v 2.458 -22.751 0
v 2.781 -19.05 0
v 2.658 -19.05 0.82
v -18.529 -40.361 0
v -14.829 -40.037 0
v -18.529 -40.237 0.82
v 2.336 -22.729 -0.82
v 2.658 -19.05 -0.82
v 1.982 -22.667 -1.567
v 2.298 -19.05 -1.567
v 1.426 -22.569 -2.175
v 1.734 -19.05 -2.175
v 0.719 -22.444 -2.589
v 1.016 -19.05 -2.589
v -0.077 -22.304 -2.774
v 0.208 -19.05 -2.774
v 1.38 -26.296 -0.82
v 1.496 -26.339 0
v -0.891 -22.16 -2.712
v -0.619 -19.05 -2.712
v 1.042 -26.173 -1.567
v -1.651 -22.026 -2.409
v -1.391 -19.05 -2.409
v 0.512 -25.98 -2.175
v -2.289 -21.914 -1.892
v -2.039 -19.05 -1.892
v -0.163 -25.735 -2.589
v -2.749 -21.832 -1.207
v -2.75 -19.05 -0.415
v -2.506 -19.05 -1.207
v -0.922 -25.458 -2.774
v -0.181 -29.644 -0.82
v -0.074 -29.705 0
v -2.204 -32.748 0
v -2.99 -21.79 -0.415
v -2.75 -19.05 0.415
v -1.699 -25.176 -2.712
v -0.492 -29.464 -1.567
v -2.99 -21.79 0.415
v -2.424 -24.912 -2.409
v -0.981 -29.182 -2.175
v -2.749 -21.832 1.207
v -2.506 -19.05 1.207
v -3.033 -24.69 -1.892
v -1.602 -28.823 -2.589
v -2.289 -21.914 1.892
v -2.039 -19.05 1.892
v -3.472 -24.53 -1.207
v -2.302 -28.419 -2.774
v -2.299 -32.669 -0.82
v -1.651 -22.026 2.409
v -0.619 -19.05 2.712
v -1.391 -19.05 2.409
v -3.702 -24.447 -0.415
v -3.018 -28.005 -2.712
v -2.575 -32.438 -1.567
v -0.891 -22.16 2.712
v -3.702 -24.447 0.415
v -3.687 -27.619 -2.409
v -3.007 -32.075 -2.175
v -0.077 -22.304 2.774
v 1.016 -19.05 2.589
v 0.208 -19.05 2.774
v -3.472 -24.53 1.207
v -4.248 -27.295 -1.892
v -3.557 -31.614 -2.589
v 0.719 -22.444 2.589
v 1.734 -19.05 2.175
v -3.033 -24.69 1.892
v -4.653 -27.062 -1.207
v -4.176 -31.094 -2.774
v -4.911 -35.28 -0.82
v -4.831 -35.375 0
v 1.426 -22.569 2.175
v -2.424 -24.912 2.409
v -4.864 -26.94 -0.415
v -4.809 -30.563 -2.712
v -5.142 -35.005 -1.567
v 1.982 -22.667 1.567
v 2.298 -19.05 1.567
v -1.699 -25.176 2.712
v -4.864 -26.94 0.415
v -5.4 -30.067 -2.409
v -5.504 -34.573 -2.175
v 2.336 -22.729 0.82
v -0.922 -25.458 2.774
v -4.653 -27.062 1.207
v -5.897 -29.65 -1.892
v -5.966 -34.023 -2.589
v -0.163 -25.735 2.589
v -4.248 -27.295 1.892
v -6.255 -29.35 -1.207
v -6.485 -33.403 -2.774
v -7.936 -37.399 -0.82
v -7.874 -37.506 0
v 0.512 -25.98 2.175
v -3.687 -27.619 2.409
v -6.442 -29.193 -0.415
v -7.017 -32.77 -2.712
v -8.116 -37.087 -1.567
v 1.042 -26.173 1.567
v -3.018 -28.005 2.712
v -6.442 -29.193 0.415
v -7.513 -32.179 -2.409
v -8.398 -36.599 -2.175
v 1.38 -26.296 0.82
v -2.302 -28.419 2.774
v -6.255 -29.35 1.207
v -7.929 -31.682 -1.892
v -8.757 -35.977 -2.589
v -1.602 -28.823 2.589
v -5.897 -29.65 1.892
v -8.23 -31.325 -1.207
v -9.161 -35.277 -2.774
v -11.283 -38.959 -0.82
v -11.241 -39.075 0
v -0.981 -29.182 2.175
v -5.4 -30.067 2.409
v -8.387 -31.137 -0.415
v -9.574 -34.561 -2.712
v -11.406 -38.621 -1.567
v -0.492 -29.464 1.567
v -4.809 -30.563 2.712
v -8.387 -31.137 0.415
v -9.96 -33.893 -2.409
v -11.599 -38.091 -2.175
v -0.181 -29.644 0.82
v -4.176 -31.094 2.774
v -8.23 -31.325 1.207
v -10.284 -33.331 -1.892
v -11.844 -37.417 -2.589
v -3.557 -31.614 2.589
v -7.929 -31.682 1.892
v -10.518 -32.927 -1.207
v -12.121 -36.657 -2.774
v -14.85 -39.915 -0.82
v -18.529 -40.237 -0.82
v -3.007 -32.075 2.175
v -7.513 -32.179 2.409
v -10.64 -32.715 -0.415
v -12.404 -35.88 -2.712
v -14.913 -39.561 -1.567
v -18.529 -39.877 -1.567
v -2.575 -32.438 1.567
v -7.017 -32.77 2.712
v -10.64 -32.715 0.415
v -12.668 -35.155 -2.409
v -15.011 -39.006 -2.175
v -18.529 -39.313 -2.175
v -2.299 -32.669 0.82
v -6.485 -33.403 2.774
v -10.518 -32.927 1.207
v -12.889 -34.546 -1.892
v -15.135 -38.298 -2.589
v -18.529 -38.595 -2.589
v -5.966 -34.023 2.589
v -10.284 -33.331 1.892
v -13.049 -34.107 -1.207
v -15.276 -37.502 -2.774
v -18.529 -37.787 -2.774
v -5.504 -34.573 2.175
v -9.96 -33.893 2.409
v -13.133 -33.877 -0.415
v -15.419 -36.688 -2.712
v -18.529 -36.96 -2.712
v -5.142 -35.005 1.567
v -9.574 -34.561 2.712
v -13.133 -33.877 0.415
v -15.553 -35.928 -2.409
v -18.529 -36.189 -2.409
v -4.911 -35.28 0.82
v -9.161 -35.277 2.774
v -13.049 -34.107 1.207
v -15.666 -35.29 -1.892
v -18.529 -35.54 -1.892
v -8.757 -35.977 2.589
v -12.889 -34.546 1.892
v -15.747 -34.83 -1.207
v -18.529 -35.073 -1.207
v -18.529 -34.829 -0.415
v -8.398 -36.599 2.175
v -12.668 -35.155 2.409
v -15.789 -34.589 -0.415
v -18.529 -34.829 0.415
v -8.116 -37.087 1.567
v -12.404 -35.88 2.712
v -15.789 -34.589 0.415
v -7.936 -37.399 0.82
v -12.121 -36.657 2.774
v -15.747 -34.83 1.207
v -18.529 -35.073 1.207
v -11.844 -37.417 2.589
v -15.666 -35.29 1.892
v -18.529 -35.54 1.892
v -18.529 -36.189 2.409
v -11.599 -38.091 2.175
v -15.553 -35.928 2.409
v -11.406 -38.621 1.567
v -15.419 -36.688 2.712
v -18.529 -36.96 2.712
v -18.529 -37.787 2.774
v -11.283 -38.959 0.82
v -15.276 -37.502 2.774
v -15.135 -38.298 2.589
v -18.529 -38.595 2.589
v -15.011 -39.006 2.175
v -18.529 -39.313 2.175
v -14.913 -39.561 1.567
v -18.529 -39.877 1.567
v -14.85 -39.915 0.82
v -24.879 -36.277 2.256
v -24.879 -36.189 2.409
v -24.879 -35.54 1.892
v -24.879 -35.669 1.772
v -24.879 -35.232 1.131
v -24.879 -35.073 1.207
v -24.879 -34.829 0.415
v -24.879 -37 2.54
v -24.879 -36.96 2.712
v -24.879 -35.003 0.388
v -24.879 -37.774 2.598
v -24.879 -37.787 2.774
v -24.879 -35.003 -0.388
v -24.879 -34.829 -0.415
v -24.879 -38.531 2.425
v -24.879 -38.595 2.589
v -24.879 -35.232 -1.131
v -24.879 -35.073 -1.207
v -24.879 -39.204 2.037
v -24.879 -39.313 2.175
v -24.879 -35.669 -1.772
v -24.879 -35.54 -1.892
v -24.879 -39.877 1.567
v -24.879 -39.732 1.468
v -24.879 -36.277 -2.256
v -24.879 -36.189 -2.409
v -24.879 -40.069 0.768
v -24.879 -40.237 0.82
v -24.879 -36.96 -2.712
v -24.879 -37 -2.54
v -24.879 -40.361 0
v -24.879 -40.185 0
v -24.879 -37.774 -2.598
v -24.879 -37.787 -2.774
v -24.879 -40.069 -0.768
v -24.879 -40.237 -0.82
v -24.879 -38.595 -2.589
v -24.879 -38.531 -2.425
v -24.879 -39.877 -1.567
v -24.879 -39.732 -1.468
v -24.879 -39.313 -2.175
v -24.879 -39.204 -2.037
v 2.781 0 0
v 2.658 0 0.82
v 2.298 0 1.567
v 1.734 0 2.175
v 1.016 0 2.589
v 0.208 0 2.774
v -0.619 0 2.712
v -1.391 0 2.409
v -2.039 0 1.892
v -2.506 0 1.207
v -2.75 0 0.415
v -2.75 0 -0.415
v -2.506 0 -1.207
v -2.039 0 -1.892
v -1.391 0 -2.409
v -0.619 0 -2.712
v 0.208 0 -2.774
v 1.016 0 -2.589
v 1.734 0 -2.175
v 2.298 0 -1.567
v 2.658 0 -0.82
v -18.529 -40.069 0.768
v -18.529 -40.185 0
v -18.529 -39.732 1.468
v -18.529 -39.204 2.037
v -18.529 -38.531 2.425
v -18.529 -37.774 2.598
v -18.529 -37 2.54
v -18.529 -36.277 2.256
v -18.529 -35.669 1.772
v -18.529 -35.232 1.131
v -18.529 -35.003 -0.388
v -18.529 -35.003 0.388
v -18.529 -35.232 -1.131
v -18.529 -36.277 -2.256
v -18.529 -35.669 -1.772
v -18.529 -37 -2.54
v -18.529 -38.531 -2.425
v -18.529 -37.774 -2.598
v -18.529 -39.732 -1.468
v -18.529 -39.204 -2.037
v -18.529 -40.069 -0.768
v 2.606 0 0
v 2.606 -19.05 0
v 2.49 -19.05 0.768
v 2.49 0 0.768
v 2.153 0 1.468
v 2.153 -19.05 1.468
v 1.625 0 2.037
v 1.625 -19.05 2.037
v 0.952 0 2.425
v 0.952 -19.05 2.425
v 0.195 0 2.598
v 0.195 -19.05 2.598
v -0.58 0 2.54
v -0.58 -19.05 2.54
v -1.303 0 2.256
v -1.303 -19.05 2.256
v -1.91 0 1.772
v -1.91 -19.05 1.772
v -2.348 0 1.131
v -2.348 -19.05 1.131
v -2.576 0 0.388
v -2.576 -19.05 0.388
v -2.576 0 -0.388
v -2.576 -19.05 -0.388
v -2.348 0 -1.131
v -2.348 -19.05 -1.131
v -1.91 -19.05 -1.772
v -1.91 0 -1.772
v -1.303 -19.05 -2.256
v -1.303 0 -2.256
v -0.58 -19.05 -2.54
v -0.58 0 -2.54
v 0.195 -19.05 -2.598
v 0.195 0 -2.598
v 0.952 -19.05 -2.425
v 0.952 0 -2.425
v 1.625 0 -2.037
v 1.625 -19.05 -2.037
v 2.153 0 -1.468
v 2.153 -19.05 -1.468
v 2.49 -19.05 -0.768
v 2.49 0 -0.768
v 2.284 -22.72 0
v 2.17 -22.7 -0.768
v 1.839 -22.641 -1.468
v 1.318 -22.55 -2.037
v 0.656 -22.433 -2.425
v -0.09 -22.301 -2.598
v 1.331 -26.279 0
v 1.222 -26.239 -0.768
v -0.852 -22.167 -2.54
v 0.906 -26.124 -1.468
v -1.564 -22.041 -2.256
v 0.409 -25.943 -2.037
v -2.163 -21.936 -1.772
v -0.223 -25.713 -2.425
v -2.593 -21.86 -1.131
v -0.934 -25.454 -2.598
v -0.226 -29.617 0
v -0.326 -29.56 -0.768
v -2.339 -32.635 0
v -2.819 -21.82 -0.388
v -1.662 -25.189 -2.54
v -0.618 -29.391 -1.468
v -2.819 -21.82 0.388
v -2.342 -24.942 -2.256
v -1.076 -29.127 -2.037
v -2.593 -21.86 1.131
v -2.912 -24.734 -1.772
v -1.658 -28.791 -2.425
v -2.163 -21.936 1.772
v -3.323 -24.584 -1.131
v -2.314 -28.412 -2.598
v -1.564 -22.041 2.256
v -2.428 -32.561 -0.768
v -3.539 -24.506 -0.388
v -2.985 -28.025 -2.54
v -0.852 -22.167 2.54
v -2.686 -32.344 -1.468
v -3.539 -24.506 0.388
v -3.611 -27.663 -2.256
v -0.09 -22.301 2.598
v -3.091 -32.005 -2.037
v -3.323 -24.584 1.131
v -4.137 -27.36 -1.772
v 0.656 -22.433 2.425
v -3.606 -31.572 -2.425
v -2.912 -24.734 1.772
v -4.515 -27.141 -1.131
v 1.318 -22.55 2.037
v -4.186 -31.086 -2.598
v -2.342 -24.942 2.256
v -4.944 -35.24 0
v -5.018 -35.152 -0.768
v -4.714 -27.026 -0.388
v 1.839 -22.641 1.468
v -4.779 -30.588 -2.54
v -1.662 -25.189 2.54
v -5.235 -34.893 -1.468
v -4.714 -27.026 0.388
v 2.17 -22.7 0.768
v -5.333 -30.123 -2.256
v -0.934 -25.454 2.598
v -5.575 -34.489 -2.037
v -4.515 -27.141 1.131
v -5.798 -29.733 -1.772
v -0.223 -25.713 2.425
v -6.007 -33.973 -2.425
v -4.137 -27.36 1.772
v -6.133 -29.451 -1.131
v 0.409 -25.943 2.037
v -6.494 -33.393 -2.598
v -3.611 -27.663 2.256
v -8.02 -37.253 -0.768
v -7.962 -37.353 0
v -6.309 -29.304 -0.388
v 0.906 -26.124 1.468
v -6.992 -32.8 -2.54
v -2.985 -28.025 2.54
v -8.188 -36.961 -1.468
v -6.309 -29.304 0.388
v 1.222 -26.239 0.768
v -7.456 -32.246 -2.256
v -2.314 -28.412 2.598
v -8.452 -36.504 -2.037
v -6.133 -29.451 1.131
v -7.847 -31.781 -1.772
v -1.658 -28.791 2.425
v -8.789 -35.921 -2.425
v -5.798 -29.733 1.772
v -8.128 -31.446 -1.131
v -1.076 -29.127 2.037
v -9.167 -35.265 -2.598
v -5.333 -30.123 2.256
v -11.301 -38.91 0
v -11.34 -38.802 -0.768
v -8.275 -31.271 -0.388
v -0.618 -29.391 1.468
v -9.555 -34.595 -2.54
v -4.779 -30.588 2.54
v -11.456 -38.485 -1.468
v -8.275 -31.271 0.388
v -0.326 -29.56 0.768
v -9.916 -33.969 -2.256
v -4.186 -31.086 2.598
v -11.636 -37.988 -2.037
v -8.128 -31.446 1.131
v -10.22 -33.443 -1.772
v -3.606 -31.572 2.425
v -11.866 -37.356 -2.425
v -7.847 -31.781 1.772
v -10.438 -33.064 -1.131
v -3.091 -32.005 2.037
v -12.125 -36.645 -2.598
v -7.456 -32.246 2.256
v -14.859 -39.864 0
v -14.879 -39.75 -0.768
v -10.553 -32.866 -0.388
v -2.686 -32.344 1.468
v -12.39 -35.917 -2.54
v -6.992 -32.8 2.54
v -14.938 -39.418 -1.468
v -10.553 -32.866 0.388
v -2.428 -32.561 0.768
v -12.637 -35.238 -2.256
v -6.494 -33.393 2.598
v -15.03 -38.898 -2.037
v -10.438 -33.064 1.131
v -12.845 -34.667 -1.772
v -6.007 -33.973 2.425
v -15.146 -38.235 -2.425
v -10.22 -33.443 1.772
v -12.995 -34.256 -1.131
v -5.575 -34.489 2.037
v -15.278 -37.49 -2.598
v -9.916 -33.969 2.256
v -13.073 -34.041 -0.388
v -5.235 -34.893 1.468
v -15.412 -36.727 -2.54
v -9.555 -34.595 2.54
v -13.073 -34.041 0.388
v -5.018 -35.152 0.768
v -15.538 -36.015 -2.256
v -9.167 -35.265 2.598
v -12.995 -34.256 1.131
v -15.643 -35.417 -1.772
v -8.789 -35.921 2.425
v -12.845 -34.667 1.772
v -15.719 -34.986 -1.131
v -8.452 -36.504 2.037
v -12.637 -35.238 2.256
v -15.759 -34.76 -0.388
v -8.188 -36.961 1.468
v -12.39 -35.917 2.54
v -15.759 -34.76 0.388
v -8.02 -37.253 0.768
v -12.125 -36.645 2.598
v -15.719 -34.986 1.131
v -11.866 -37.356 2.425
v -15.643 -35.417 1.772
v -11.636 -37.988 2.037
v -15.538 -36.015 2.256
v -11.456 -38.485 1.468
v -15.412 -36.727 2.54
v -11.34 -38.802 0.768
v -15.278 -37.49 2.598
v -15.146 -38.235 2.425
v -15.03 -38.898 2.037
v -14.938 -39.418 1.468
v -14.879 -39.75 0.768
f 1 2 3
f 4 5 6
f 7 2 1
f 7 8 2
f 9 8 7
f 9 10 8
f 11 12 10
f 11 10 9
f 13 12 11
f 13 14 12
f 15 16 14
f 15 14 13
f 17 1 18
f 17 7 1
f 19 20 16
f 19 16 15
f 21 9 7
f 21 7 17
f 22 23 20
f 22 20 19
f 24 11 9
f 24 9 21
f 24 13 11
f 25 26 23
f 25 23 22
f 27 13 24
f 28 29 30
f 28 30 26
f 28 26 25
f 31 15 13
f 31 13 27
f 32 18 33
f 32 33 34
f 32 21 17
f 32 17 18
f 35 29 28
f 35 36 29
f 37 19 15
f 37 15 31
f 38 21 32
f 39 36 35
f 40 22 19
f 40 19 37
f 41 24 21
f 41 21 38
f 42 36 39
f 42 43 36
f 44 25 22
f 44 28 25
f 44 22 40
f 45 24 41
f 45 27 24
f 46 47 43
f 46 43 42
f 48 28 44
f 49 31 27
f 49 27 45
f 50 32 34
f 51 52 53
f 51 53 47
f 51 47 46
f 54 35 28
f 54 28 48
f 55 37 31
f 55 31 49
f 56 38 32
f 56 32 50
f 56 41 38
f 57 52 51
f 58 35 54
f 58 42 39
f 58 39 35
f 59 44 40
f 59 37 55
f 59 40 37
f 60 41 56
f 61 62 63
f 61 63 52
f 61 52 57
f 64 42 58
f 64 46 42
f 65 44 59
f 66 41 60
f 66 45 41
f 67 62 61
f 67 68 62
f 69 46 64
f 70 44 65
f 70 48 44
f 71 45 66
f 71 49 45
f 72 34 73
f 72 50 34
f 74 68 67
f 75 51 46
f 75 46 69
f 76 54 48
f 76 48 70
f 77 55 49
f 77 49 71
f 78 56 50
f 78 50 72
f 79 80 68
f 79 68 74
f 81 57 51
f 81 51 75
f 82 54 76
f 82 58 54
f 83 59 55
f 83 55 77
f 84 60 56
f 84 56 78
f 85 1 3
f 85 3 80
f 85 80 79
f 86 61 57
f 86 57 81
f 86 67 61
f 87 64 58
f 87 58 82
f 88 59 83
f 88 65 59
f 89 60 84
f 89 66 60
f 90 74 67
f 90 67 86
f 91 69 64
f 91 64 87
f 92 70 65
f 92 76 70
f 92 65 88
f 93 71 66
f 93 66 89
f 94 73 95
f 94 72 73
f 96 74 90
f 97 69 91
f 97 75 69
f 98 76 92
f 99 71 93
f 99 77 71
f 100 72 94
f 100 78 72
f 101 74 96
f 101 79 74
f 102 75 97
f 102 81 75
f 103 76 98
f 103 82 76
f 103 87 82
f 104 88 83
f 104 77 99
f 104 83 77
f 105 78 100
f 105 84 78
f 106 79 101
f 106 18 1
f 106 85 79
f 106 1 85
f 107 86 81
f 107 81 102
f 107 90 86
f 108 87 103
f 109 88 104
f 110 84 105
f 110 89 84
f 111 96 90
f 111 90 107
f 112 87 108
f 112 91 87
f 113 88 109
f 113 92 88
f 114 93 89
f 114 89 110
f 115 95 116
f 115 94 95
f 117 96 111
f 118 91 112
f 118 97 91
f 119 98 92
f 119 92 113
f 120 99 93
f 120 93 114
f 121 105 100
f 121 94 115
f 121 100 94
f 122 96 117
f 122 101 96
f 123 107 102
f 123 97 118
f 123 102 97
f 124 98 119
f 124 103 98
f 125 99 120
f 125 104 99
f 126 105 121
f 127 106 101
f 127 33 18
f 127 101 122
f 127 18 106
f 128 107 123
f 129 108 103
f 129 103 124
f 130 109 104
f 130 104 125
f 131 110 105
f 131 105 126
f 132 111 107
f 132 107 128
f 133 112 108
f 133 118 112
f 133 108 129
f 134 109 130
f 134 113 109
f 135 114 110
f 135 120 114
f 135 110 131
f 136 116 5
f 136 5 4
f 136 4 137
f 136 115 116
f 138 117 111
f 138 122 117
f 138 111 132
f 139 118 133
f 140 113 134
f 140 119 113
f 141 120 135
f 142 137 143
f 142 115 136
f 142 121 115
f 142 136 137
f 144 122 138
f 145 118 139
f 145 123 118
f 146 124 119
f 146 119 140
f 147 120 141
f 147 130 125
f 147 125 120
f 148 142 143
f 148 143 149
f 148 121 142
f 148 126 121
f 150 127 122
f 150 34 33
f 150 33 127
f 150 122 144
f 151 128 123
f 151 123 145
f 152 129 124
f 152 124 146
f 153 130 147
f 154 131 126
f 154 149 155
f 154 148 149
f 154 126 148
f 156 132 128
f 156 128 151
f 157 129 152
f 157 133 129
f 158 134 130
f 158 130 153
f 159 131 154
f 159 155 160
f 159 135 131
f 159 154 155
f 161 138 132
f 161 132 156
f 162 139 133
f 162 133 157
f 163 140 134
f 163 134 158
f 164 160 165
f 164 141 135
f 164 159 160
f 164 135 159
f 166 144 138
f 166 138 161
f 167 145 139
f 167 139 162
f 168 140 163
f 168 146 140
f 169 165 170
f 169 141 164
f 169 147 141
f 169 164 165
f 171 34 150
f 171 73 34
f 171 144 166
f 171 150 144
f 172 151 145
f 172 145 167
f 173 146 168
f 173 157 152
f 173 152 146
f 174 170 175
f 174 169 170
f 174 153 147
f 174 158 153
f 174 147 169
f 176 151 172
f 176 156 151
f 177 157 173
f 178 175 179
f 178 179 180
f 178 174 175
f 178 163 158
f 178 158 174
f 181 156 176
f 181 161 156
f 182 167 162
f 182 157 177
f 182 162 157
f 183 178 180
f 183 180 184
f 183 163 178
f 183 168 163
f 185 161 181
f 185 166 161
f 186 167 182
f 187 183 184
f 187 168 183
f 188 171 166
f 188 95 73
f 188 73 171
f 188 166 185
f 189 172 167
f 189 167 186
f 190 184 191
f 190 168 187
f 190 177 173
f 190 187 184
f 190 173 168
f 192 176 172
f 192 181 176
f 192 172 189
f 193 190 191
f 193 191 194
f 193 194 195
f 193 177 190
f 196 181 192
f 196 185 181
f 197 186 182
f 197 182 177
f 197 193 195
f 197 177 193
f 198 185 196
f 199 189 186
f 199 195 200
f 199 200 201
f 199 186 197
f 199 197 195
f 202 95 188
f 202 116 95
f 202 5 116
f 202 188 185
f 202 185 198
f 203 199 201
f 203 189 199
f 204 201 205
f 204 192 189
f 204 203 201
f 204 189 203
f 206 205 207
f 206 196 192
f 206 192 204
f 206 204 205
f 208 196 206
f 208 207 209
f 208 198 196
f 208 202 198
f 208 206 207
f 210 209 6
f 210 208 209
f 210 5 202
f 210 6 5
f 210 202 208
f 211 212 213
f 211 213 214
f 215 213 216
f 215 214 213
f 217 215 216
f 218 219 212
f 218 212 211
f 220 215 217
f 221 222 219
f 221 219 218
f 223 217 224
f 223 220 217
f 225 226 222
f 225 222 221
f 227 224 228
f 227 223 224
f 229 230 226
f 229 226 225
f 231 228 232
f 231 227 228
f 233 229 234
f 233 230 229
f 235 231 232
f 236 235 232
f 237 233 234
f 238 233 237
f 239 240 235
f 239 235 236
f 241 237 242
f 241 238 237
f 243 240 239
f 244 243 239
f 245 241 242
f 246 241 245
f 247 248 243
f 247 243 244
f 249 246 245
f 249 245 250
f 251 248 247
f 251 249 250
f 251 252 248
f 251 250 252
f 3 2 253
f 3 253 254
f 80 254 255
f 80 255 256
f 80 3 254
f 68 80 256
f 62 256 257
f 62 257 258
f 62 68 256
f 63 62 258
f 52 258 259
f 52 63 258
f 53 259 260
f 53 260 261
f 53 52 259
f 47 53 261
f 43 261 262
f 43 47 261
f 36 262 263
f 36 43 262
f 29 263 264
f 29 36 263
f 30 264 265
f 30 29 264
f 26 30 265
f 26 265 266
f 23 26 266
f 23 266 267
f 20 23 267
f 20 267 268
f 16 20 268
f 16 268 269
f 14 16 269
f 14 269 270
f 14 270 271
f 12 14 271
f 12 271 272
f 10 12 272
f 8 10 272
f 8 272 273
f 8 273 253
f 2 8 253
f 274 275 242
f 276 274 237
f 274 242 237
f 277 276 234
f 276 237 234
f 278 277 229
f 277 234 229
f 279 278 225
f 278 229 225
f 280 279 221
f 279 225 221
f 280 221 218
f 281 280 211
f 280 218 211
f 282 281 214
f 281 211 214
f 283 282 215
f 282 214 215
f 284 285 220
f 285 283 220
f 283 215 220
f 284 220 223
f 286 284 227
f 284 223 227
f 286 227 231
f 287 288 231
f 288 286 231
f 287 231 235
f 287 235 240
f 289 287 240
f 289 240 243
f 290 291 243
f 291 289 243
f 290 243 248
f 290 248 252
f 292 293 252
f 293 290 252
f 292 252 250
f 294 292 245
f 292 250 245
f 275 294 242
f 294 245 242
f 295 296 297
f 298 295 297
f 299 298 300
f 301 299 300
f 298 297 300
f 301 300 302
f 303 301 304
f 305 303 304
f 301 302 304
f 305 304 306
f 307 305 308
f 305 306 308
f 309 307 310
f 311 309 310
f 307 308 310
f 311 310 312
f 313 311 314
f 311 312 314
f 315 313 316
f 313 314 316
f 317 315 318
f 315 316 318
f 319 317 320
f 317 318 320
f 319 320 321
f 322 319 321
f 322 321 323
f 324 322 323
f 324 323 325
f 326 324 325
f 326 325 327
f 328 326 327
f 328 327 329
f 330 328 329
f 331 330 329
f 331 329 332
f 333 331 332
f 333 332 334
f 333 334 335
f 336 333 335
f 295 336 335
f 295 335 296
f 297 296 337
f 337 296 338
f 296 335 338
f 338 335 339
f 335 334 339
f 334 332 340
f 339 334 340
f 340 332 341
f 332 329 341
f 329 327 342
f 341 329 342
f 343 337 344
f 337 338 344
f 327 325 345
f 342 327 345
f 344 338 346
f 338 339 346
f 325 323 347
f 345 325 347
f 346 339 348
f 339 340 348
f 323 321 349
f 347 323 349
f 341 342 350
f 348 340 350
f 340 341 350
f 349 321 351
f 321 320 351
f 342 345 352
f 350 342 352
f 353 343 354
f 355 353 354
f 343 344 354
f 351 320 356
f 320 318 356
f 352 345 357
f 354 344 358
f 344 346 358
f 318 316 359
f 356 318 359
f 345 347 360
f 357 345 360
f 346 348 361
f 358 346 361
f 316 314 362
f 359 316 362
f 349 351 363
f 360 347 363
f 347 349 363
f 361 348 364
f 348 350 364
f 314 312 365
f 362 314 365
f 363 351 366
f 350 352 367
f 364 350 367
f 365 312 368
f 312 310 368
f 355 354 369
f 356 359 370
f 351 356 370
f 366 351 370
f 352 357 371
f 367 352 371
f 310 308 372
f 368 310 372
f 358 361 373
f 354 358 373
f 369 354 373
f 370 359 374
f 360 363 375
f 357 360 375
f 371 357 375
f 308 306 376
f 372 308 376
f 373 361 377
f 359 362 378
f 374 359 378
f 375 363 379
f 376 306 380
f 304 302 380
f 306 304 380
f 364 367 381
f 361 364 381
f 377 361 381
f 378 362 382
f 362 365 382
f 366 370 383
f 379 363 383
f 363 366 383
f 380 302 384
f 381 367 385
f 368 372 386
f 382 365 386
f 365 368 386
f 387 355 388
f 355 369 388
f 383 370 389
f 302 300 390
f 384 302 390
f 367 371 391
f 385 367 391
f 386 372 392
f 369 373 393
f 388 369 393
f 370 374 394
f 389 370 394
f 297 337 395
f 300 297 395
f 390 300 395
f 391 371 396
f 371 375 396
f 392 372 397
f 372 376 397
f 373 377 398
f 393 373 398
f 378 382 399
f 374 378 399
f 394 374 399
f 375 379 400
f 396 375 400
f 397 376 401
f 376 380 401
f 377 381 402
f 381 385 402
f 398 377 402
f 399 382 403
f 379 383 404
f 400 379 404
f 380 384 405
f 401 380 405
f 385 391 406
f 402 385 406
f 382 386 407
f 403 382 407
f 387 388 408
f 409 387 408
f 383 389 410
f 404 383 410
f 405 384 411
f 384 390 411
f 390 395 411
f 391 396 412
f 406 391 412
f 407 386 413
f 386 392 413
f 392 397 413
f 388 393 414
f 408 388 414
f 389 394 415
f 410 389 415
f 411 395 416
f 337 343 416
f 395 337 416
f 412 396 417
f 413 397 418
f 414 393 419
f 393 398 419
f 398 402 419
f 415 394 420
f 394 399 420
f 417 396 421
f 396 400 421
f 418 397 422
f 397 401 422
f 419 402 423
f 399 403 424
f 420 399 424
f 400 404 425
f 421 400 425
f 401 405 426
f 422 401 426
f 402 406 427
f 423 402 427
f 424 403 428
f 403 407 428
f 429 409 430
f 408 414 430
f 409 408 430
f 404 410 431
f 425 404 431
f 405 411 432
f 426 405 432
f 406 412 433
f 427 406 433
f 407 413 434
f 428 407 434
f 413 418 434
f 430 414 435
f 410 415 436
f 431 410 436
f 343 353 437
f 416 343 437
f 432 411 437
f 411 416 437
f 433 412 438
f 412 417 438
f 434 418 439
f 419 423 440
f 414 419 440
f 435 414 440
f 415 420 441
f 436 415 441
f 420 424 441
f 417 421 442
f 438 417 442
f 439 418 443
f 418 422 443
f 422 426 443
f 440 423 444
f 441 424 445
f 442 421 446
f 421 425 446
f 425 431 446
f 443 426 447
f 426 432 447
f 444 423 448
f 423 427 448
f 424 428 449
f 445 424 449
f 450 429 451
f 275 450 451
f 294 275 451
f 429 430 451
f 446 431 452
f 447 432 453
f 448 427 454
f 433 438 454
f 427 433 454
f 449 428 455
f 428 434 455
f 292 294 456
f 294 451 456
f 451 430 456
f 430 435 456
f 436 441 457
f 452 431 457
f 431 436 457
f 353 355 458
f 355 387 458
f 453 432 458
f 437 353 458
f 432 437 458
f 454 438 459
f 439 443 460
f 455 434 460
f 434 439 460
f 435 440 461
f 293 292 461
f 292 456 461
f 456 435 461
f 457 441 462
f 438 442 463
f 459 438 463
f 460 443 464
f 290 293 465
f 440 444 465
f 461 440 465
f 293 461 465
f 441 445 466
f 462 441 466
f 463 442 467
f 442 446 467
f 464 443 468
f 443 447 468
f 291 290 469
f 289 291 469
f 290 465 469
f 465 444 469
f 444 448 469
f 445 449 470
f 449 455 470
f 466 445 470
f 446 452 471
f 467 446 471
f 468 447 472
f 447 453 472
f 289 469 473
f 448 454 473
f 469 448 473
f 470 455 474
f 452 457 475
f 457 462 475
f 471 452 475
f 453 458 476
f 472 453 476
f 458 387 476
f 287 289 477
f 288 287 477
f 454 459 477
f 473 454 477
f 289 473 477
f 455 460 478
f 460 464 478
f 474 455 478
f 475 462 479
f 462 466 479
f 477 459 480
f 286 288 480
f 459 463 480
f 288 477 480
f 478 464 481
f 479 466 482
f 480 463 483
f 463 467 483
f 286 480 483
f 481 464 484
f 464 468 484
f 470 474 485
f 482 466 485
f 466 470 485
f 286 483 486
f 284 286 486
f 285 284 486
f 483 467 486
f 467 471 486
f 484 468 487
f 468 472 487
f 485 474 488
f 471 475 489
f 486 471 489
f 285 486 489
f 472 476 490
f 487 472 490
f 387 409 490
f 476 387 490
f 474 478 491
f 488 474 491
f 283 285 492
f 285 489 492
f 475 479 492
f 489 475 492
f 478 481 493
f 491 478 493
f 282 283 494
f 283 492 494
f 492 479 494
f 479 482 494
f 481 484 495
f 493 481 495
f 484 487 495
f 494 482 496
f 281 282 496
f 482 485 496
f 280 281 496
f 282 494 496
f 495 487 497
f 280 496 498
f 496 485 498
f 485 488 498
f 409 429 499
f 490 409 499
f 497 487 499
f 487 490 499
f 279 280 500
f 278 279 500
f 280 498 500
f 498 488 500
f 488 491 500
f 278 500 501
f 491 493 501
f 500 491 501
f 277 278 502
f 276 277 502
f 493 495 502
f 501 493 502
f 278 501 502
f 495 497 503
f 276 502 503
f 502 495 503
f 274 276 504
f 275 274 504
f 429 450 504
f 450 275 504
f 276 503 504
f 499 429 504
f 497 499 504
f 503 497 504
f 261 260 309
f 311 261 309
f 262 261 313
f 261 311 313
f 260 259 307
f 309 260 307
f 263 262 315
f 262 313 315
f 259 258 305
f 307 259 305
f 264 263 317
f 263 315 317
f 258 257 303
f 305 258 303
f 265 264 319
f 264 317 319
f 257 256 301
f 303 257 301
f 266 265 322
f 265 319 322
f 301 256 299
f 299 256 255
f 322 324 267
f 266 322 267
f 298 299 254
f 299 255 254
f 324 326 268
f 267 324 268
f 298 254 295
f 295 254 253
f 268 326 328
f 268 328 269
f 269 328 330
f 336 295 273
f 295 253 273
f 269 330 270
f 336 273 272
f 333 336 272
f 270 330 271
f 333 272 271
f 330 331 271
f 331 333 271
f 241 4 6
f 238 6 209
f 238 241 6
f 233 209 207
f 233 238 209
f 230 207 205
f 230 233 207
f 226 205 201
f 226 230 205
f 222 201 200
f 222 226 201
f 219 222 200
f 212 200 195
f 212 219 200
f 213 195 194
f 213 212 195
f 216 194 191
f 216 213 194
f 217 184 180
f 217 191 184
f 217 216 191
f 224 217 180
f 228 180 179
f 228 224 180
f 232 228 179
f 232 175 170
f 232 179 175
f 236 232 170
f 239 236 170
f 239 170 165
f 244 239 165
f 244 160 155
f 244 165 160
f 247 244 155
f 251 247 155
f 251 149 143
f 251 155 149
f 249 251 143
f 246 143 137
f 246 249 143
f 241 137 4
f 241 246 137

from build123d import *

# Parameters (mm, degrees)
F0_R = 2.7813
F3_R = 2.6055738226


with BuildPart() as f2:
    # F2: sweep along a path in F1
    with BuildLine(Plane.XY) as f2_path:
        Line((0, 0), (0, -19.05))
        ThreePointArc((0, -19.05), (-5.4271063194, -32.1521936806), (-18.5293, -37.5793))
        Line((-18.5293, -37.5793), (-24.8793, -37.5793))
    # F0 (on Front) → F2 (sweep)
    with BuildSketch(Plane.XZ):
        Circle(F0_R)
    sweep(path=f2_path.line)

    # F4: sweep along a path in F1
    with BuildLine(Plane.XY) as f4_path:
        Line((0, 0), (0, -19.05))
        ThreePointArc((0, -19.05), (-5.4271063194, -32.1521936806), (-18.5293, -37.5793))
        Line((-18.5293, -37.5793), (-24.8793, -37.5793))
    # F3 (on face) → F4 (sweep, cut)
    with BuildSketch(Plane(origin=(-24.8793, 0, 0), x_dir=(0, -1, 0), z_dir=(-1, 0, 0))):
        with Locations((37.5793, 0)):
            Circle(F3_R)
    sweep(path=f4_path.line, mode=Mode.SUBTRACT)


solid = f2.part
